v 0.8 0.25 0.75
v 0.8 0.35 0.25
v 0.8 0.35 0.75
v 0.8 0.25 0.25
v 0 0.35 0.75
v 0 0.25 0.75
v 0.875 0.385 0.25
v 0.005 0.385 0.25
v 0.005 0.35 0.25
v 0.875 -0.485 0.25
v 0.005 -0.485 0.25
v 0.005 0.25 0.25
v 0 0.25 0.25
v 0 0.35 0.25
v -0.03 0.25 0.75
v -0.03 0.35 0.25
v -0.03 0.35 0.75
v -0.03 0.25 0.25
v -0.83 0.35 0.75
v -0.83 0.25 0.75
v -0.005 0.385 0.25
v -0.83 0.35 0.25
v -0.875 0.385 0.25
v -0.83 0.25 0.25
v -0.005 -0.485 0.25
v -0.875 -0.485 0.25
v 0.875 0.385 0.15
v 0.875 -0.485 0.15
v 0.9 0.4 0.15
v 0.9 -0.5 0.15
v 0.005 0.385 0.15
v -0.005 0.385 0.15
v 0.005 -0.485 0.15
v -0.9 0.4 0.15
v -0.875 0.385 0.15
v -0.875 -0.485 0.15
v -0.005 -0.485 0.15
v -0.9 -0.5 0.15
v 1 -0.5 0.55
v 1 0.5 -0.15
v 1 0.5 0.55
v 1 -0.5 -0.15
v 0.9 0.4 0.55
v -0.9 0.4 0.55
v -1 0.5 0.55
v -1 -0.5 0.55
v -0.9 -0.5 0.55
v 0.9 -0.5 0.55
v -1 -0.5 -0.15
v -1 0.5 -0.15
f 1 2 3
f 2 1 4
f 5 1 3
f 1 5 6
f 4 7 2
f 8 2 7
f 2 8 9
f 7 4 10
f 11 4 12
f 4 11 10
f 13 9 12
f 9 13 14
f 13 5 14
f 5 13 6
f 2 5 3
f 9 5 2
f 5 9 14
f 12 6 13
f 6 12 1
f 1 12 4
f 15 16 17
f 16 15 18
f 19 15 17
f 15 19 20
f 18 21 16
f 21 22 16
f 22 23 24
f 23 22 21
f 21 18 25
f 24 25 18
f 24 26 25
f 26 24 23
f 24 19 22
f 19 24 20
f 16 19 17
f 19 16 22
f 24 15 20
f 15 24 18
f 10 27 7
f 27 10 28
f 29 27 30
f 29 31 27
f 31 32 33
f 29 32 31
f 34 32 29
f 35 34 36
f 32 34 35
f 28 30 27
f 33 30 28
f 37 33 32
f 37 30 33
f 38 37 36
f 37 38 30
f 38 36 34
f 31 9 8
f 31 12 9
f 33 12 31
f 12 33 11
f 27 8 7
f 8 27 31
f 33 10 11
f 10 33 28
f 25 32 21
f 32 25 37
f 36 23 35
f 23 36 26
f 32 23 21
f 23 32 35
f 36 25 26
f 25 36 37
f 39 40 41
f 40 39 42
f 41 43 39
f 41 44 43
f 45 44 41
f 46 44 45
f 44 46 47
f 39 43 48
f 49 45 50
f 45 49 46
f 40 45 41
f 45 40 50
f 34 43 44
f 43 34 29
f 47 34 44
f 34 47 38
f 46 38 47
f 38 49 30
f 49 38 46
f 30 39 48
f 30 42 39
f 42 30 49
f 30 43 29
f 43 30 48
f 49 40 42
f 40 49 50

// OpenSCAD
module Sofa(){

    color("#eadebd"){
    translate([0.4,0.3,0.5])
    cube([0.8,0.1,0.5],center = true);

    translate([-0.43,0.3,0.5])
    cube([0.8,0.1,0.5],center = true);
    }

    color("#eadebd"){
    translate([0.44,-0.05,0.2])
    cube([0.87,0.87,0.1],center = true);

    translate([-0.44,-0.05,0.2])
    cube([0.87,0.87,0.1],center = true);
    }

    color("#c5d4d9"){
    translate([0,0.45,0.3])
    cube([2,0.1,0.5],center = true);

    translate([-0.95,0,0.3])
    cube([0.1,1,0.5],center = true);

    translate([0.95,0,0.3])
    cube([0.1,1,0.5],center = true);

    cube([2,1,0.3], center = true);
    }

}

Sofa();

// Written by Nicolì Angelo (Gengio) 2024: 
// MIT License

//Permission is hereby granted, free of charge, to any person obtaining a copy of this software and associated documentation files (the "Software"), to deal in the Software without restriction, including without limitation the rights to use, copy, modify, merge, publish, distribute, sublicense, and/or sell copies of the Software, and to permit persons to whom the Software is furnished to do so, subject to the following conditions:

//The above copyright notice and this permission notice shall be included in all copies or substantial portions of the Software.

//THE SOFTWARE IS PROVIDED "AS IS", WITHOUT WARRANTY OF ANY KIND, EXPRESS OR IMPLIED, INCLUDING BUT NOT LIMITED TO THE WARRANTIES OF MERCHANTABILITY, FITNESS FOR A PARTICULAR PURPOSE AND NONINFRINGEMENT. IN NO EVENT SHALL THE AUTHORS OR COPYRIGHT HOLDERS BE LIABLE FOR ANY CLAIM, DAMAGES OR OTHER LIABILITY, WHETHER IN AN ACTION OF CONTRACT, TORT OR OTHERWISE, ARISING FROM, OUT OF OR IN CONNECTION WITH THE SOFTWARE OR THE USE OR OTHER DEALINGS IN THE SOFTWARE.
